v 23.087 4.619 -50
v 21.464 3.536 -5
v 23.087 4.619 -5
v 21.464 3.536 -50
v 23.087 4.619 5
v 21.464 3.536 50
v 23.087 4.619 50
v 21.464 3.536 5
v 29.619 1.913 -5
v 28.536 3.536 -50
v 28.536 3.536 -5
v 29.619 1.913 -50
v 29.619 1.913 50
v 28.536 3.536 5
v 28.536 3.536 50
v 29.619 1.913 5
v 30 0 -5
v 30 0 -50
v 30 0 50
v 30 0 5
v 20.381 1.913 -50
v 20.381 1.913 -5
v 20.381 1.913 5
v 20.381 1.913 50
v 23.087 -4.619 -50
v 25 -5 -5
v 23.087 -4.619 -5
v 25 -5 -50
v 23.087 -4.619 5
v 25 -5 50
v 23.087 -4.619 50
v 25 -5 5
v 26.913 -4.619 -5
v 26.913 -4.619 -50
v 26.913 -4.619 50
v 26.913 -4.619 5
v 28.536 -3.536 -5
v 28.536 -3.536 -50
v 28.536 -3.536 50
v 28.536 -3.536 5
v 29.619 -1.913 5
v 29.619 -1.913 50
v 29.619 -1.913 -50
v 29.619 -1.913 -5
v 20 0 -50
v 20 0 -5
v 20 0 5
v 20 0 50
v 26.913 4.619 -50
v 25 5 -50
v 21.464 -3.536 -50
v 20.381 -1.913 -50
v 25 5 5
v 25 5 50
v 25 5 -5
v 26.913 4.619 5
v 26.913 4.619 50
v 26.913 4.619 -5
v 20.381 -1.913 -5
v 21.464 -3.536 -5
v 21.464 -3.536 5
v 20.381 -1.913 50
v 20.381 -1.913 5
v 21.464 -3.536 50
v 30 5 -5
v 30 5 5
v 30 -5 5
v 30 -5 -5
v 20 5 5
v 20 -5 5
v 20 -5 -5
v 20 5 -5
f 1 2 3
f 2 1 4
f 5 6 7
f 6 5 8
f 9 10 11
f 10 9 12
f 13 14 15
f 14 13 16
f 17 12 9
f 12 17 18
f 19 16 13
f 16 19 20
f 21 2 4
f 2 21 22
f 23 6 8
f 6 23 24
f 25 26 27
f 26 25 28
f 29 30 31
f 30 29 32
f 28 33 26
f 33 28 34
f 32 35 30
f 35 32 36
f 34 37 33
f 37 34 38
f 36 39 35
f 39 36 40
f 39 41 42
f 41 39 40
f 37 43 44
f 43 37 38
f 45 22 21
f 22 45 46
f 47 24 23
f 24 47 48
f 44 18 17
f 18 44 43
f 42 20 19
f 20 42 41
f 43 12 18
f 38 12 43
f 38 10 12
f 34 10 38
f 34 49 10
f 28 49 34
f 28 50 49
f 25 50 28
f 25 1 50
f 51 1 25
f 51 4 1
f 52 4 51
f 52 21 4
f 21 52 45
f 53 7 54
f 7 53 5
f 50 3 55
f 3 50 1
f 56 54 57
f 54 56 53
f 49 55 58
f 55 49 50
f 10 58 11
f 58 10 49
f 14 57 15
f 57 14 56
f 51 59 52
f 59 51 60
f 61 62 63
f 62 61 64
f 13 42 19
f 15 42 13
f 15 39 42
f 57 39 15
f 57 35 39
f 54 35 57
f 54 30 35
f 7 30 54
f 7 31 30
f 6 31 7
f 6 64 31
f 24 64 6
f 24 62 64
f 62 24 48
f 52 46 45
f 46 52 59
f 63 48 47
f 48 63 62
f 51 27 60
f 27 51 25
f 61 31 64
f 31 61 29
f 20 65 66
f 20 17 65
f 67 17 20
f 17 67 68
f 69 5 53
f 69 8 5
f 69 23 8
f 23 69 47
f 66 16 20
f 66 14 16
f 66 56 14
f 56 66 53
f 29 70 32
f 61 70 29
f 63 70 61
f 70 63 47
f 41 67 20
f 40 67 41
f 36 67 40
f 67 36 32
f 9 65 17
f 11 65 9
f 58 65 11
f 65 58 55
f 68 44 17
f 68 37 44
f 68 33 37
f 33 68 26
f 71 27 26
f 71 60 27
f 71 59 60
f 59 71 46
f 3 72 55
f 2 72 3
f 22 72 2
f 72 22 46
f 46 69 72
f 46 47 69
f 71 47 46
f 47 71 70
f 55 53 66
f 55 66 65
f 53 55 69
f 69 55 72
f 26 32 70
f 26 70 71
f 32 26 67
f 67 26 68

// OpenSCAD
module hole(size) {
	cylinder(r = size, h = 100, center = true); 
	cube(size=[10, 10, 10], center=true); 
} 

translate([25, 0, 0]) {
	hole(5); 
}
